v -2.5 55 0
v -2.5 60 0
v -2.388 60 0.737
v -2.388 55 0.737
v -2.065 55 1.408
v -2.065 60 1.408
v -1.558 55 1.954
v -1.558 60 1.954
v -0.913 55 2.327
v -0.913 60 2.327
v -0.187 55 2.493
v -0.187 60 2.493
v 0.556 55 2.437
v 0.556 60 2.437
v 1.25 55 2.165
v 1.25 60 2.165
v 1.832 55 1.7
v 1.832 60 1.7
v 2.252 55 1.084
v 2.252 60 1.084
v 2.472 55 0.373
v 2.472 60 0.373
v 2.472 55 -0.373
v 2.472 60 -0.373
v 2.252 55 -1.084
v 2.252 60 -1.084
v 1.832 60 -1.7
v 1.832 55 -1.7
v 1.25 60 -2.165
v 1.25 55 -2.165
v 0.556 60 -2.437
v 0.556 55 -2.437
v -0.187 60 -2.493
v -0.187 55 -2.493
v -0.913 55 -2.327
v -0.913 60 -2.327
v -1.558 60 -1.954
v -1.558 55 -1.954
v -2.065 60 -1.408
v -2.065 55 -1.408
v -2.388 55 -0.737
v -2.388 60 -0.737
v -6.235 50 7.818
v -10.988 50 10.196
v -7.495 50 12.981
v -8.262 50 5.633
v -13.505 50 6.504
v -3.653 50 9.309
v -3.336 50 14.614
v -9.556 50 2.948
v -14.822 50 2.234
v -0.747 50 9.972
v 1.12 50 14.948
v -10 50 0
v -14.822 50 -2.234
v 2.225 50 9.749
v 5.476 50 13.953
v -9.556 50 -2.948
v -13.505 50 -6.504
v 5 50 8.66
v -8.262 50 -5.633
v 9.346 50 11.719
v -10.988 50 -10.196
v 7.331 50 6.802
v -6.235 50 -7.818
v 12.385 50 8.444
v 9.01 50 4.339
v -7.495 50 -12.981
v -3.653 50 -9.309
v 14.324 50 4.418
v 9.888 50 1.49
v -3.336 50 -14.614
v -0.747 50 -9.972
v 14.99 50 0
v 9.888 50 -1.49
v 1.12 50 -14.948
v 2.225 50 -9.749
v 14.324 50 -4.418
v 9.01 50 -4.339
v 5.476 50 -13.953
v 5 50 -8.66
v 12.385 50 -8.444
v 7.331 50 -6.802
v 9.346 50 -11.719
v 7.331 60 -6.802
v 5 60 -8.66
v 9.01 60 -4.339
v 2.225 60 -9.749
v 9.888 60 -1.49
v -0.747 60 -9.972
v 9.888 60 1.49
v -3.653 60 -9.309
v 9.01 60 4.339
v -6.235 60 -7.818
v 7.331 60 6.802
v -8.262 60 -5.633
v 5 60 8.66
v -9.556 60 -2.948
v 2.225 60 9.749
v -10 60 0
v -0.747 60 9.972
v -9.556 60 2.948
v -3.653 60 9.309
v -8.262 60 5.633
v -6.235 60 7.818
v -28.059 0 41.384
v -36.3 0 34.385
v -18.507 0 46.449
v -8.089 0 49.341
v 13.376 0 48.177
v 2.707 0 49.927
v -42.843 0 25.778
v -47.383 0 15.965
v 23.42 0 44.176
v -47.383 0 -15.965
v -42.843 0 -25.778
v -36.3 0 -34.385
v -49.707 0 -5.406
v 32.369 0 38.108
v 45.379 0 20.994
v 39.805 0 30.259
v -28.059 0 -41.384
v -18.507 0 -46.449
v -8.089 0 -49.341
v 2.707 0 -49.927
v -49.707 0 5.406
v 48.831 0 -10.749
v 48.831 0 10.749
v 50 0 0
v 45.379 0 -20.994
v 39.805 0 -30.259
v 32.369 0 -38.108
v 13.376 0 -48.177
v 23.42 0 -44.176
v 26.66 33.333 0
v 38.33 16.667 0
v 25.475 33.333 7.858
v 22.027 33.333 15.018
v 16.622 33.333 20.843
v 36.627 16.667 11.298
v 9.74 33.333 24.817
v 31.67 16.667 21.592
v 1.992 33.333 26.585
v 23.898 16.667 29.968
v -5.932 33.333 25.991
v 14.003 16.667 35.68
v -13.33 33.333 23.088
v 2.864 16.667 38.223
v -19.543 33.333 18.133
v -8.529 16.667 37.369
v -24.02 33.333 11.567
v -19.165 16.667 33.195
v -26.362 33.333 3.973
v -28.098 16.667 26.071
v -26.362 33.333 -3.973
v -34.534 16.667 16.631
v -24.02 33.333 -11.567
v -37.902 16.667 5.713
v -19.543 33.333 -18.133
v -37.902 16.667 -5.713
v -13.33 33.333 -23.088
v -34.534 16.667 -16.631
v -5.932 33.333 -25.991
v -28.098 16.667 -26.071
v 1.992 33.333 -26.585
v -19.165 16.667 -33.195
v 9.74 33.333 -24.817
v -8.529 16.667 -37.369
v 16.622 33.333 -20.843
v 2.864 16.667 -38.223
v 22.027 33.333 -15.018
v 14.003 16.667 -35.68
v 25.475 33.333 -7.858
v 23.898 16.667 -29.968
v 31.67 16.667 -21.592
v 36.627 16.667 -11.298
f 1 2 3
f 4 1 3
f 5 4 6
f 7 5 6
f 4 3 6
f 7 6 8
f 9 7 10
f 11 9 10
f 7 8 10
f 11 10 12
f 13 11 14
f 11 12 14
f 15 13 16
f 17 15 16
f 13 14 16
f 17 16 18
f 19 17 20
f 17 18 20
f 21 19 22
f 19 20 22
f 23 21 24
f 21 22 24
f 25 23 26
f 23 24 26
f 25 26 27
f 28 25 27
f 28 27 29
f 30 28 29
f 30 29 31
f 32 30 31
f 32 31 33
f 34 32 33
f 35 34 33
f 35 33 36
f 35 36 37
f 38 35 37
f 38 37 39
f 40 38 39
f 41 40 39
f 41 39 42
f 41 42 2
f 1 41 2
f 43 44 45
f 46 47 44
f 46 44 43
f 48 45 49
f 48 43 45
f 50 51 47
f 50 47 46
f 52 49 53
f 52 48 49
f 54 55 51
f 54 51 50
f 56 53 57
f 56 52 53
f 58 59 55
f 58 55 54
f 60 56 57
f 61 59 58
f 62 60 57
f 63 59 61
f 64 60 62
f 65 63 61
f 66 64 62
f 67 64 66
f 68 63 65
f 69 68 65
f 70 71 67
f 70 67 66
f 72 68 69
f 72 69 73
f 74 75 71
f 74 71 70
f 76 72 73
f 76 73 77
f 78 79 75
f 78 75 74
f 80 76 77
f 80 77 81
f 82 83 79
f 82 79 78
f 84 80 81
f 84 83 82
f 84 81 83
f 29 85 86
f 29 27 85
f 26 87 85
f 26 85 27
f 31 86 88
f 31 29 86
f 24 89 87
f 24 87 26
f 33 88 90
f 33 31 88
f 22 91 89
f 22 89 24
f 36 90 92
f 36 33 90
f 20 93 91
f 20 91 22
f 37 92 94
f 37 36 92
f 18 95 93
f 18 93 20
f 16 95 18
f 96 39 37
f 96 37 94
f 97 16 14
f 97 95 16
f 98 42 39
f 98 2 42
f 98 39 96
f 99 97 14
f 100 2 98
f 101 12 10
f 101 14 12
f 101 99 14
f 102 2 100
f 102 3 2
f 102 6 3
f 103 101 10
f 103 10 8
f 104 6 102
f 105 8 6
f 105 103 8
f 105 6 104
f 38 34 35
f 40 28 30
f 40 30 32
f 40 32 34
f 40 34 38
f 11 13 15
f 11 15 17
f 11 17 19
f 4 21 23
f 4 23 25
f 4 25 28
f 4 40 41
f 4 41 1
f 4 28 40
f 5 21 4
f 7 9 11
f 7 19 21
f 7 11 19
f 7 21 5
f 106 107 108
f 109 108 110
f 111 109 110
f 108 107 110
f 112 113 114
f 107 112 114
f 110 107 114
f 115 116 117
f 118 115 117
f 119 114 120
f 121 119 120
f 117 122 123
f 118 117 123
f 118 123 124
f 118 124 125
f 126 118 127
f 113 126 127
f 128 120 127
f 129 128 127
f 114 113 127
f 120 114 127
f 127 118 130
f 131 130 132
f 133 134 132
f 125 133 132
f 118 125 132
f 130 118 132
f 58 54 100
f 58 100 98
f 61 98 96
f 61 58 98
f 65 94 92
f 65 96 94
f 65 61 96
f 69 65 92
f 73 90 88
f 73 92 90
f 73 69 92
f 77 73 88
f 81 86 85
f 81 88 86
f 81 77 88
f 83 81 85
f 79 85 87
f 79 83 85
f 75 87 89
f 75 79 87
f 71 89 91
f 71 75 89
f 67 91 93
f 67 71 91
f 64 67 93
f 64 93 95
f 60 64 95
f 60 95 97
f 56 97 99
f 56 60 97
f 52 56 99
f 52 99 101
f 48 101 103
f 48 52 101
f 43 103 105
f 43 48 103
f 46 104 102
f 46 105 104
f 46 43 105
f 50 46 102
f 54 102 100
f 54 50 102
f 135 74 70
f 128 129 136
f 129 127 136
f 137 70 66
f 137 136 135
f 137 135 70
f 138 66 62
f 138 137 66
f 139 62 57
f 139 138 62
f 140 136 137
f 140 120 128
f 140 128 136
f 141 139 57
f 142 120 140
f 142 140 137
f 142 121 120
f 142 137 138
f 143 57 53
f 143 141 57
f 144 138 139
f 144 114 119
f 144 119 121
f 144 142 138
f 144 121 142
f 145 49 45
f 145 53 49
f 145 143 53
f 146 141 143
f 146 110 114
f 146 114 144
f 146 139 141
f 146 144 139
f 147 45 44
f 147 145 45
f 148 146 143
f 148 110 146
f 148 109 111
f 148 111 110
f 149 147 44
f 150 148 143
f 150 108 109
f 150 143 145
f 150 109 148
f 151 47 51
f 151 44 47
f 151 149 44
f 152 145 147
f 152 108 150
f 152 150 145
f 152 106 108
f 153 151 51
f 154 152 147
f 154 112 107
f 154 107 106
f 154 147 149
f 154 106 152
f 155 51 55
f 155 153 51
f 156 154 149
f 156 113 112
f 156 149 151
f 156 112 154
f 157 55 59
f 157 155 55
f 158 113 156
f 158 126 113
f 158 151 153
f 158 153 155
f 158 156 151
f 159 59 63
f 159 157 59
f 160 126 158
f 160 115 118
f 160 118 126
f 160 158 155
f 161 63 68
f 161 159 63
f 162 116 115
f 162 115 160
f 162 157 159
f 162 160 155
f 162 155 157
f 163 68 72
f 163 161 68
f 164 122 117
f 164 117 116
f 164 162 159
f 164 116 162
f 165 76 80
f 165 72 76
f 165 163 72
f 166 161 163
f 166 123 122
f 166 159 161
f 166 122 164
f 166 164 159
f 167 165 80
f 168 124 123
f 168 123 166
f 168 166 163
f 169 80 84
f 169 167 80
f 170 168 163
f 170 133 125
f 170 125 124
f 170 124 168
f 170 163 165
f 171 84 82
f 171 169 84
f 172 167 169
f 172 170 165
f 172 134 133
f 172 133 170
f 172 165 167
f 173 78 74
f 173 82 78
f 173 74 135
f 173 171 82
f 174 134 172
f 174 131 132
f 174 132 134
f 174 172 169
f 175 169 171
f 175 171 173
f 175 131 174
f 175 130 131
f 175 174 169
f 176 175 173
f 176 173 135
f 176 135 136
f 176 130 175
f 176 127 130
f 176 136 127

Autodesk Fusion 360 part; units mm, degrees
sketch "Sketch1" plane through (0, 0, 0) normal (0, 1, 0) x (1, 0, 0)
  circle A0 centre (0, 0) radius 50
  dimension "d1" = 100
extrude "Extrude1" add sketch "Sketch1" along normal blind 50 draft -35 makes body 1
sketch "Sketch2" plane through (0, 50, 0) normal (0, 1, 0) x (-1, 0, 0)
  circle A0 centre (0, 0) radius 14.9896
sketch "Sketch3" plane through (0, 50, 0) normal (0, 1, 0) x (-1, 0, 0)
  circle A0 centre (0, 0) radius 10
  dimension "d5" = 20
extrude "Extrude2" add sketch "Sketch3" along normal blind 10 bodies 1
sketch "Sketch4" plane through (0, 60, 0) normal (0, 1, 0) x (-1, 0, 0)
  circle A0 centre (0, 0) radius 10
  circle A1 centre (0, 0) radius 2.4995
  dimension "d8" = 4.999
extrude "Extrude3" cut sketch "Sketch4" against normal blind 5 contours A1 bodies 1
copy_body "Body->Comp1" bodies 1 removing the originals makes body 2 in component "Component"
component "Component" placed x (1, 0, 0) y (0, 1, 0) z (0, 0, 1) at (0, 0, 0)
